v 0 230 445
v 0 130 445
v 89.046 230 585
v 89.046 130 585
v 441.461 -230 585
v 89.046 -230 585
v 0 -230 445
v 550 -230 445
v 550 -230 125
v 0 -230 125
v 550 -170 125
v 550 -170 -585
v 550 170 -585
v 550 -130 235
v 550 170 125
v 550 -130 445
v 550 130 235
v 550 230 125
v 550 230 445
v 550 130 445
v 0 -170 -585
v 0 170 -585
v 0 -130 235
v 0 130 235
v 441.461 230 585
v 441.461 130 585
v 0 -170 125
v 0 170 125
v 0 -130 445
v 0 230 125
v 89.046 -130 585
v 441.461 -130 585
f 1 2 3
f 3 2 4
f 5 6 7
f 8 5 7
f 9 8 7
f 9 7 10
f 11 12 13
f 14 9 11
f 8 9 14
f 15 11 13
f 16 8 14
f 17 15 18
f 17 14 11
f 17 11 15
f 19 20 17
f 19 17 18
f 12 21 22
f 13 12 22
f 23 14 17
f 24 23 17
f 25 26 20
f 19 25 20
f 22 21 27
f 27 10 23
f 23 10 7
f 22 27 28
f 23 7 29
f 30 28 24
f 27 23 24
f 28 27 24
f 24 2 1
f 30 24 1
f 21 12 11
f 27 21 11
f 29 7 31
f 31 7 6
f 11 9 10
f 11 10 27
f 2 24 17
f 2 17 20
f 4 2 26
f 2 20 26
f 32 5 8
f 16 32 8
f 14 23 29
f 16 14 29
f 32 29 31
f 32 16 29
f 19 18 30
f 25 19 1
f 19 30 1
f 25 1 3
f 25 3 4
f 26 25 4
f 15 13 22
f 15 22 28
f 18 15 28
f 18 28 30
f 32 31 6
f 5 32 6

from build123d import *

# Parameters (mm, degrees)
F1_DEPTH  = 550
F2_W      = 60
F2_H      = 710
F3_DEPTH  = 550.001
F4_W      = 60
F4_H      = 710
F5_DEPTH  = 550.001
F6_W      = 260
F6_H      = 700
F7_DEPTH  = 550.001
F9_DEPTH  = 460.001
F11_DEPTH = 460.001


with BuildPart() as f1:
    # F0 (on Right) → F1 (new body)
    with BuildSketch(Plane.YZ):
        Polygon((-230, 585), (-230, -585), (230, -585), (230, 125), (230, 585), align=None)
    extrude(amount=F1_DEPTH)

    # F2 (on face) → F3 (cut, through all)
    with BuildSketch(Plane.YZ.offset(550)):
        with Locations((-200, -230)):
            Rectangle(F2_W, F2_H)
    extrude(amount=-F3_DEPTH, mode=Mode.SUBTRACT)

    # F4 (on face) → F5 (cut, through all)
    with BuildSketch(Plane.YZ.offset(550)):
        with Locations((200, -230)):
            Rectangle(F4_W, F4_H)
    extrude(amount=-F5_DEPTH, mode=Mode.SUBTRACT)

    # F6 (on face) → F7 (cut, through all)
    with BuildSketch(Plane.YZ.offset(550)):
        with Locations((0, 585)):
            Rectangle(F6_W, F6_H)
    extrude(amount=-F7_DEPTH, mode=Mode.SUBTRACT)

    # F8 (on face) → F9 (cut, through all)
    with BuildSketch(Plane.XZ.offset(230)):
        Polygon((0, 445), (89.0458141333, 585), (0, 585), align=None)
    extrude(amount=-F9_DEPTH, mode=Mode.SUBTRACT)

    # F10 (on face) → F11 (cut, through all)
    with BuildSketch(Plane.XZ.offset(230)):
        Polygon((550, 585), (441.4610564709, 585), (550, 445), align=None)
    extrude(amount=-F11_DEPTH, mode=Mode.SUBTRACT)


solid = f1.part
